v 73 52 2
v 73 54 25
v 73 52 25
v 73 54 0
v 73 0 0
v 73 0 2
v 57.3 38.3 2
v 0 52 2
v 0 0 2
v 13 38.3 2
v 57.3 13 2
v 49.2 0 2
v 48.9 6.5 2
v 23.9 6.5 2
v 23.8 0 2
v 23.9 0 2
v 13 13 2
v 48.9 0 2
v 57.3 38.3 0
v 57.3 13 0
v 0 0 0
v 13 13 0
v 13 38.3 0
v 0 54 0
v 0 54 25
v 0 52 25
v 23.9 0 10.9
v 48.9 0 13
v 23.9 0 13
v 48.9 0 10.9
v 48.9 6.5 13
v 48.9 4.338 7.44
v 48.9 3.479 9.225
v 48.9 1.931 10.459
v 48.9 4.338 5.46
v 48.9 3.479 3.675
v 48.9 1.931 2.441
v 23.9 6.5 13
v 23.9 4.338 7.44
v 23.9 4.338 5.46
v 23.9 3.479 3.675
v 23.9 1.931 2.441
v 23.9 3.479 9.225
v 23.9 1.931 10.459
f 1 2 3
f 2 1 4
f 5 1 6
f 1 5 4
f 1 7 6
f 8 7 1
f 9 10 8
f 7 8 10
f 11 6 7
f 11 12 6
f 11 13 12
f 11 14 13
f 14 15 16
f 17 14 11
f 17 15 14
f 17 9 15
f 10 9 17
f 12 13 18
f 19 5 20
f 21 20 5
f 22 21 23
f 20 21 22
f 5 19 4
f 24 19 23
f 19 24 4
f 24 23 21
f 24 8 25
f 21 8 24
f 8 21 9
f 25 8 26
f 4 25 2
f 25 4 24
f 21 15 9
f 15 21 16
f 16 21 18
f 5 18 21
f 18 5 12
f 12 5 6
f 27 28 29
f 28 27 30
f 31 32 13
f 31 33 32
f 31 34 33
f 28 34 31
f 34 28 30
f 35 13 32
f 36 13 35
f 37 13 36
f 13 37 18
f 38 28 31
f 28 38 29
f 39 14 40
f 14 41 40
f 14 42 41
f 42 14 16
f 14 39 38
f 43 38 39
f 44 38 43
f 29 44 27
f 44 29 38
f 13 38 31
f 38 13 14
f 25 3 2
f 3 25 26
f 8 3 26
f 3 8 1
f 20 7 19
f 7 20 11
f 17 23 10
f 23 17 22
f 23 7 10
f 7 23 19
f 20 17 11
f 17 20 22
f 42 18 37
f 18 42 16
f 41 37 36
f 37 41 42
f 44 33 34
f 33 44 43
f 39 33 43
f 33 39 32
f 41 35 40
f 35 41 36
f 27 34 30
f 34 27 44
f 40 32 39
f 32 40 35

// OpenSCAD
difference()
{
    union()
    {
        cube([73,54,2]);
        translate([(73-25.2)/2,0,0])
            cube([25,6.5,13]);
        translate([0,52,0])
            cube([73,2,25]);
        
    }
    translate([13,13,-1])
        cube([44 +.3,25 +.3,4]);
    translate([(73-25.4)/2,0,6.45])
        rotate([0,90,0])
            cylinder(25.4, r=4.45);
}
